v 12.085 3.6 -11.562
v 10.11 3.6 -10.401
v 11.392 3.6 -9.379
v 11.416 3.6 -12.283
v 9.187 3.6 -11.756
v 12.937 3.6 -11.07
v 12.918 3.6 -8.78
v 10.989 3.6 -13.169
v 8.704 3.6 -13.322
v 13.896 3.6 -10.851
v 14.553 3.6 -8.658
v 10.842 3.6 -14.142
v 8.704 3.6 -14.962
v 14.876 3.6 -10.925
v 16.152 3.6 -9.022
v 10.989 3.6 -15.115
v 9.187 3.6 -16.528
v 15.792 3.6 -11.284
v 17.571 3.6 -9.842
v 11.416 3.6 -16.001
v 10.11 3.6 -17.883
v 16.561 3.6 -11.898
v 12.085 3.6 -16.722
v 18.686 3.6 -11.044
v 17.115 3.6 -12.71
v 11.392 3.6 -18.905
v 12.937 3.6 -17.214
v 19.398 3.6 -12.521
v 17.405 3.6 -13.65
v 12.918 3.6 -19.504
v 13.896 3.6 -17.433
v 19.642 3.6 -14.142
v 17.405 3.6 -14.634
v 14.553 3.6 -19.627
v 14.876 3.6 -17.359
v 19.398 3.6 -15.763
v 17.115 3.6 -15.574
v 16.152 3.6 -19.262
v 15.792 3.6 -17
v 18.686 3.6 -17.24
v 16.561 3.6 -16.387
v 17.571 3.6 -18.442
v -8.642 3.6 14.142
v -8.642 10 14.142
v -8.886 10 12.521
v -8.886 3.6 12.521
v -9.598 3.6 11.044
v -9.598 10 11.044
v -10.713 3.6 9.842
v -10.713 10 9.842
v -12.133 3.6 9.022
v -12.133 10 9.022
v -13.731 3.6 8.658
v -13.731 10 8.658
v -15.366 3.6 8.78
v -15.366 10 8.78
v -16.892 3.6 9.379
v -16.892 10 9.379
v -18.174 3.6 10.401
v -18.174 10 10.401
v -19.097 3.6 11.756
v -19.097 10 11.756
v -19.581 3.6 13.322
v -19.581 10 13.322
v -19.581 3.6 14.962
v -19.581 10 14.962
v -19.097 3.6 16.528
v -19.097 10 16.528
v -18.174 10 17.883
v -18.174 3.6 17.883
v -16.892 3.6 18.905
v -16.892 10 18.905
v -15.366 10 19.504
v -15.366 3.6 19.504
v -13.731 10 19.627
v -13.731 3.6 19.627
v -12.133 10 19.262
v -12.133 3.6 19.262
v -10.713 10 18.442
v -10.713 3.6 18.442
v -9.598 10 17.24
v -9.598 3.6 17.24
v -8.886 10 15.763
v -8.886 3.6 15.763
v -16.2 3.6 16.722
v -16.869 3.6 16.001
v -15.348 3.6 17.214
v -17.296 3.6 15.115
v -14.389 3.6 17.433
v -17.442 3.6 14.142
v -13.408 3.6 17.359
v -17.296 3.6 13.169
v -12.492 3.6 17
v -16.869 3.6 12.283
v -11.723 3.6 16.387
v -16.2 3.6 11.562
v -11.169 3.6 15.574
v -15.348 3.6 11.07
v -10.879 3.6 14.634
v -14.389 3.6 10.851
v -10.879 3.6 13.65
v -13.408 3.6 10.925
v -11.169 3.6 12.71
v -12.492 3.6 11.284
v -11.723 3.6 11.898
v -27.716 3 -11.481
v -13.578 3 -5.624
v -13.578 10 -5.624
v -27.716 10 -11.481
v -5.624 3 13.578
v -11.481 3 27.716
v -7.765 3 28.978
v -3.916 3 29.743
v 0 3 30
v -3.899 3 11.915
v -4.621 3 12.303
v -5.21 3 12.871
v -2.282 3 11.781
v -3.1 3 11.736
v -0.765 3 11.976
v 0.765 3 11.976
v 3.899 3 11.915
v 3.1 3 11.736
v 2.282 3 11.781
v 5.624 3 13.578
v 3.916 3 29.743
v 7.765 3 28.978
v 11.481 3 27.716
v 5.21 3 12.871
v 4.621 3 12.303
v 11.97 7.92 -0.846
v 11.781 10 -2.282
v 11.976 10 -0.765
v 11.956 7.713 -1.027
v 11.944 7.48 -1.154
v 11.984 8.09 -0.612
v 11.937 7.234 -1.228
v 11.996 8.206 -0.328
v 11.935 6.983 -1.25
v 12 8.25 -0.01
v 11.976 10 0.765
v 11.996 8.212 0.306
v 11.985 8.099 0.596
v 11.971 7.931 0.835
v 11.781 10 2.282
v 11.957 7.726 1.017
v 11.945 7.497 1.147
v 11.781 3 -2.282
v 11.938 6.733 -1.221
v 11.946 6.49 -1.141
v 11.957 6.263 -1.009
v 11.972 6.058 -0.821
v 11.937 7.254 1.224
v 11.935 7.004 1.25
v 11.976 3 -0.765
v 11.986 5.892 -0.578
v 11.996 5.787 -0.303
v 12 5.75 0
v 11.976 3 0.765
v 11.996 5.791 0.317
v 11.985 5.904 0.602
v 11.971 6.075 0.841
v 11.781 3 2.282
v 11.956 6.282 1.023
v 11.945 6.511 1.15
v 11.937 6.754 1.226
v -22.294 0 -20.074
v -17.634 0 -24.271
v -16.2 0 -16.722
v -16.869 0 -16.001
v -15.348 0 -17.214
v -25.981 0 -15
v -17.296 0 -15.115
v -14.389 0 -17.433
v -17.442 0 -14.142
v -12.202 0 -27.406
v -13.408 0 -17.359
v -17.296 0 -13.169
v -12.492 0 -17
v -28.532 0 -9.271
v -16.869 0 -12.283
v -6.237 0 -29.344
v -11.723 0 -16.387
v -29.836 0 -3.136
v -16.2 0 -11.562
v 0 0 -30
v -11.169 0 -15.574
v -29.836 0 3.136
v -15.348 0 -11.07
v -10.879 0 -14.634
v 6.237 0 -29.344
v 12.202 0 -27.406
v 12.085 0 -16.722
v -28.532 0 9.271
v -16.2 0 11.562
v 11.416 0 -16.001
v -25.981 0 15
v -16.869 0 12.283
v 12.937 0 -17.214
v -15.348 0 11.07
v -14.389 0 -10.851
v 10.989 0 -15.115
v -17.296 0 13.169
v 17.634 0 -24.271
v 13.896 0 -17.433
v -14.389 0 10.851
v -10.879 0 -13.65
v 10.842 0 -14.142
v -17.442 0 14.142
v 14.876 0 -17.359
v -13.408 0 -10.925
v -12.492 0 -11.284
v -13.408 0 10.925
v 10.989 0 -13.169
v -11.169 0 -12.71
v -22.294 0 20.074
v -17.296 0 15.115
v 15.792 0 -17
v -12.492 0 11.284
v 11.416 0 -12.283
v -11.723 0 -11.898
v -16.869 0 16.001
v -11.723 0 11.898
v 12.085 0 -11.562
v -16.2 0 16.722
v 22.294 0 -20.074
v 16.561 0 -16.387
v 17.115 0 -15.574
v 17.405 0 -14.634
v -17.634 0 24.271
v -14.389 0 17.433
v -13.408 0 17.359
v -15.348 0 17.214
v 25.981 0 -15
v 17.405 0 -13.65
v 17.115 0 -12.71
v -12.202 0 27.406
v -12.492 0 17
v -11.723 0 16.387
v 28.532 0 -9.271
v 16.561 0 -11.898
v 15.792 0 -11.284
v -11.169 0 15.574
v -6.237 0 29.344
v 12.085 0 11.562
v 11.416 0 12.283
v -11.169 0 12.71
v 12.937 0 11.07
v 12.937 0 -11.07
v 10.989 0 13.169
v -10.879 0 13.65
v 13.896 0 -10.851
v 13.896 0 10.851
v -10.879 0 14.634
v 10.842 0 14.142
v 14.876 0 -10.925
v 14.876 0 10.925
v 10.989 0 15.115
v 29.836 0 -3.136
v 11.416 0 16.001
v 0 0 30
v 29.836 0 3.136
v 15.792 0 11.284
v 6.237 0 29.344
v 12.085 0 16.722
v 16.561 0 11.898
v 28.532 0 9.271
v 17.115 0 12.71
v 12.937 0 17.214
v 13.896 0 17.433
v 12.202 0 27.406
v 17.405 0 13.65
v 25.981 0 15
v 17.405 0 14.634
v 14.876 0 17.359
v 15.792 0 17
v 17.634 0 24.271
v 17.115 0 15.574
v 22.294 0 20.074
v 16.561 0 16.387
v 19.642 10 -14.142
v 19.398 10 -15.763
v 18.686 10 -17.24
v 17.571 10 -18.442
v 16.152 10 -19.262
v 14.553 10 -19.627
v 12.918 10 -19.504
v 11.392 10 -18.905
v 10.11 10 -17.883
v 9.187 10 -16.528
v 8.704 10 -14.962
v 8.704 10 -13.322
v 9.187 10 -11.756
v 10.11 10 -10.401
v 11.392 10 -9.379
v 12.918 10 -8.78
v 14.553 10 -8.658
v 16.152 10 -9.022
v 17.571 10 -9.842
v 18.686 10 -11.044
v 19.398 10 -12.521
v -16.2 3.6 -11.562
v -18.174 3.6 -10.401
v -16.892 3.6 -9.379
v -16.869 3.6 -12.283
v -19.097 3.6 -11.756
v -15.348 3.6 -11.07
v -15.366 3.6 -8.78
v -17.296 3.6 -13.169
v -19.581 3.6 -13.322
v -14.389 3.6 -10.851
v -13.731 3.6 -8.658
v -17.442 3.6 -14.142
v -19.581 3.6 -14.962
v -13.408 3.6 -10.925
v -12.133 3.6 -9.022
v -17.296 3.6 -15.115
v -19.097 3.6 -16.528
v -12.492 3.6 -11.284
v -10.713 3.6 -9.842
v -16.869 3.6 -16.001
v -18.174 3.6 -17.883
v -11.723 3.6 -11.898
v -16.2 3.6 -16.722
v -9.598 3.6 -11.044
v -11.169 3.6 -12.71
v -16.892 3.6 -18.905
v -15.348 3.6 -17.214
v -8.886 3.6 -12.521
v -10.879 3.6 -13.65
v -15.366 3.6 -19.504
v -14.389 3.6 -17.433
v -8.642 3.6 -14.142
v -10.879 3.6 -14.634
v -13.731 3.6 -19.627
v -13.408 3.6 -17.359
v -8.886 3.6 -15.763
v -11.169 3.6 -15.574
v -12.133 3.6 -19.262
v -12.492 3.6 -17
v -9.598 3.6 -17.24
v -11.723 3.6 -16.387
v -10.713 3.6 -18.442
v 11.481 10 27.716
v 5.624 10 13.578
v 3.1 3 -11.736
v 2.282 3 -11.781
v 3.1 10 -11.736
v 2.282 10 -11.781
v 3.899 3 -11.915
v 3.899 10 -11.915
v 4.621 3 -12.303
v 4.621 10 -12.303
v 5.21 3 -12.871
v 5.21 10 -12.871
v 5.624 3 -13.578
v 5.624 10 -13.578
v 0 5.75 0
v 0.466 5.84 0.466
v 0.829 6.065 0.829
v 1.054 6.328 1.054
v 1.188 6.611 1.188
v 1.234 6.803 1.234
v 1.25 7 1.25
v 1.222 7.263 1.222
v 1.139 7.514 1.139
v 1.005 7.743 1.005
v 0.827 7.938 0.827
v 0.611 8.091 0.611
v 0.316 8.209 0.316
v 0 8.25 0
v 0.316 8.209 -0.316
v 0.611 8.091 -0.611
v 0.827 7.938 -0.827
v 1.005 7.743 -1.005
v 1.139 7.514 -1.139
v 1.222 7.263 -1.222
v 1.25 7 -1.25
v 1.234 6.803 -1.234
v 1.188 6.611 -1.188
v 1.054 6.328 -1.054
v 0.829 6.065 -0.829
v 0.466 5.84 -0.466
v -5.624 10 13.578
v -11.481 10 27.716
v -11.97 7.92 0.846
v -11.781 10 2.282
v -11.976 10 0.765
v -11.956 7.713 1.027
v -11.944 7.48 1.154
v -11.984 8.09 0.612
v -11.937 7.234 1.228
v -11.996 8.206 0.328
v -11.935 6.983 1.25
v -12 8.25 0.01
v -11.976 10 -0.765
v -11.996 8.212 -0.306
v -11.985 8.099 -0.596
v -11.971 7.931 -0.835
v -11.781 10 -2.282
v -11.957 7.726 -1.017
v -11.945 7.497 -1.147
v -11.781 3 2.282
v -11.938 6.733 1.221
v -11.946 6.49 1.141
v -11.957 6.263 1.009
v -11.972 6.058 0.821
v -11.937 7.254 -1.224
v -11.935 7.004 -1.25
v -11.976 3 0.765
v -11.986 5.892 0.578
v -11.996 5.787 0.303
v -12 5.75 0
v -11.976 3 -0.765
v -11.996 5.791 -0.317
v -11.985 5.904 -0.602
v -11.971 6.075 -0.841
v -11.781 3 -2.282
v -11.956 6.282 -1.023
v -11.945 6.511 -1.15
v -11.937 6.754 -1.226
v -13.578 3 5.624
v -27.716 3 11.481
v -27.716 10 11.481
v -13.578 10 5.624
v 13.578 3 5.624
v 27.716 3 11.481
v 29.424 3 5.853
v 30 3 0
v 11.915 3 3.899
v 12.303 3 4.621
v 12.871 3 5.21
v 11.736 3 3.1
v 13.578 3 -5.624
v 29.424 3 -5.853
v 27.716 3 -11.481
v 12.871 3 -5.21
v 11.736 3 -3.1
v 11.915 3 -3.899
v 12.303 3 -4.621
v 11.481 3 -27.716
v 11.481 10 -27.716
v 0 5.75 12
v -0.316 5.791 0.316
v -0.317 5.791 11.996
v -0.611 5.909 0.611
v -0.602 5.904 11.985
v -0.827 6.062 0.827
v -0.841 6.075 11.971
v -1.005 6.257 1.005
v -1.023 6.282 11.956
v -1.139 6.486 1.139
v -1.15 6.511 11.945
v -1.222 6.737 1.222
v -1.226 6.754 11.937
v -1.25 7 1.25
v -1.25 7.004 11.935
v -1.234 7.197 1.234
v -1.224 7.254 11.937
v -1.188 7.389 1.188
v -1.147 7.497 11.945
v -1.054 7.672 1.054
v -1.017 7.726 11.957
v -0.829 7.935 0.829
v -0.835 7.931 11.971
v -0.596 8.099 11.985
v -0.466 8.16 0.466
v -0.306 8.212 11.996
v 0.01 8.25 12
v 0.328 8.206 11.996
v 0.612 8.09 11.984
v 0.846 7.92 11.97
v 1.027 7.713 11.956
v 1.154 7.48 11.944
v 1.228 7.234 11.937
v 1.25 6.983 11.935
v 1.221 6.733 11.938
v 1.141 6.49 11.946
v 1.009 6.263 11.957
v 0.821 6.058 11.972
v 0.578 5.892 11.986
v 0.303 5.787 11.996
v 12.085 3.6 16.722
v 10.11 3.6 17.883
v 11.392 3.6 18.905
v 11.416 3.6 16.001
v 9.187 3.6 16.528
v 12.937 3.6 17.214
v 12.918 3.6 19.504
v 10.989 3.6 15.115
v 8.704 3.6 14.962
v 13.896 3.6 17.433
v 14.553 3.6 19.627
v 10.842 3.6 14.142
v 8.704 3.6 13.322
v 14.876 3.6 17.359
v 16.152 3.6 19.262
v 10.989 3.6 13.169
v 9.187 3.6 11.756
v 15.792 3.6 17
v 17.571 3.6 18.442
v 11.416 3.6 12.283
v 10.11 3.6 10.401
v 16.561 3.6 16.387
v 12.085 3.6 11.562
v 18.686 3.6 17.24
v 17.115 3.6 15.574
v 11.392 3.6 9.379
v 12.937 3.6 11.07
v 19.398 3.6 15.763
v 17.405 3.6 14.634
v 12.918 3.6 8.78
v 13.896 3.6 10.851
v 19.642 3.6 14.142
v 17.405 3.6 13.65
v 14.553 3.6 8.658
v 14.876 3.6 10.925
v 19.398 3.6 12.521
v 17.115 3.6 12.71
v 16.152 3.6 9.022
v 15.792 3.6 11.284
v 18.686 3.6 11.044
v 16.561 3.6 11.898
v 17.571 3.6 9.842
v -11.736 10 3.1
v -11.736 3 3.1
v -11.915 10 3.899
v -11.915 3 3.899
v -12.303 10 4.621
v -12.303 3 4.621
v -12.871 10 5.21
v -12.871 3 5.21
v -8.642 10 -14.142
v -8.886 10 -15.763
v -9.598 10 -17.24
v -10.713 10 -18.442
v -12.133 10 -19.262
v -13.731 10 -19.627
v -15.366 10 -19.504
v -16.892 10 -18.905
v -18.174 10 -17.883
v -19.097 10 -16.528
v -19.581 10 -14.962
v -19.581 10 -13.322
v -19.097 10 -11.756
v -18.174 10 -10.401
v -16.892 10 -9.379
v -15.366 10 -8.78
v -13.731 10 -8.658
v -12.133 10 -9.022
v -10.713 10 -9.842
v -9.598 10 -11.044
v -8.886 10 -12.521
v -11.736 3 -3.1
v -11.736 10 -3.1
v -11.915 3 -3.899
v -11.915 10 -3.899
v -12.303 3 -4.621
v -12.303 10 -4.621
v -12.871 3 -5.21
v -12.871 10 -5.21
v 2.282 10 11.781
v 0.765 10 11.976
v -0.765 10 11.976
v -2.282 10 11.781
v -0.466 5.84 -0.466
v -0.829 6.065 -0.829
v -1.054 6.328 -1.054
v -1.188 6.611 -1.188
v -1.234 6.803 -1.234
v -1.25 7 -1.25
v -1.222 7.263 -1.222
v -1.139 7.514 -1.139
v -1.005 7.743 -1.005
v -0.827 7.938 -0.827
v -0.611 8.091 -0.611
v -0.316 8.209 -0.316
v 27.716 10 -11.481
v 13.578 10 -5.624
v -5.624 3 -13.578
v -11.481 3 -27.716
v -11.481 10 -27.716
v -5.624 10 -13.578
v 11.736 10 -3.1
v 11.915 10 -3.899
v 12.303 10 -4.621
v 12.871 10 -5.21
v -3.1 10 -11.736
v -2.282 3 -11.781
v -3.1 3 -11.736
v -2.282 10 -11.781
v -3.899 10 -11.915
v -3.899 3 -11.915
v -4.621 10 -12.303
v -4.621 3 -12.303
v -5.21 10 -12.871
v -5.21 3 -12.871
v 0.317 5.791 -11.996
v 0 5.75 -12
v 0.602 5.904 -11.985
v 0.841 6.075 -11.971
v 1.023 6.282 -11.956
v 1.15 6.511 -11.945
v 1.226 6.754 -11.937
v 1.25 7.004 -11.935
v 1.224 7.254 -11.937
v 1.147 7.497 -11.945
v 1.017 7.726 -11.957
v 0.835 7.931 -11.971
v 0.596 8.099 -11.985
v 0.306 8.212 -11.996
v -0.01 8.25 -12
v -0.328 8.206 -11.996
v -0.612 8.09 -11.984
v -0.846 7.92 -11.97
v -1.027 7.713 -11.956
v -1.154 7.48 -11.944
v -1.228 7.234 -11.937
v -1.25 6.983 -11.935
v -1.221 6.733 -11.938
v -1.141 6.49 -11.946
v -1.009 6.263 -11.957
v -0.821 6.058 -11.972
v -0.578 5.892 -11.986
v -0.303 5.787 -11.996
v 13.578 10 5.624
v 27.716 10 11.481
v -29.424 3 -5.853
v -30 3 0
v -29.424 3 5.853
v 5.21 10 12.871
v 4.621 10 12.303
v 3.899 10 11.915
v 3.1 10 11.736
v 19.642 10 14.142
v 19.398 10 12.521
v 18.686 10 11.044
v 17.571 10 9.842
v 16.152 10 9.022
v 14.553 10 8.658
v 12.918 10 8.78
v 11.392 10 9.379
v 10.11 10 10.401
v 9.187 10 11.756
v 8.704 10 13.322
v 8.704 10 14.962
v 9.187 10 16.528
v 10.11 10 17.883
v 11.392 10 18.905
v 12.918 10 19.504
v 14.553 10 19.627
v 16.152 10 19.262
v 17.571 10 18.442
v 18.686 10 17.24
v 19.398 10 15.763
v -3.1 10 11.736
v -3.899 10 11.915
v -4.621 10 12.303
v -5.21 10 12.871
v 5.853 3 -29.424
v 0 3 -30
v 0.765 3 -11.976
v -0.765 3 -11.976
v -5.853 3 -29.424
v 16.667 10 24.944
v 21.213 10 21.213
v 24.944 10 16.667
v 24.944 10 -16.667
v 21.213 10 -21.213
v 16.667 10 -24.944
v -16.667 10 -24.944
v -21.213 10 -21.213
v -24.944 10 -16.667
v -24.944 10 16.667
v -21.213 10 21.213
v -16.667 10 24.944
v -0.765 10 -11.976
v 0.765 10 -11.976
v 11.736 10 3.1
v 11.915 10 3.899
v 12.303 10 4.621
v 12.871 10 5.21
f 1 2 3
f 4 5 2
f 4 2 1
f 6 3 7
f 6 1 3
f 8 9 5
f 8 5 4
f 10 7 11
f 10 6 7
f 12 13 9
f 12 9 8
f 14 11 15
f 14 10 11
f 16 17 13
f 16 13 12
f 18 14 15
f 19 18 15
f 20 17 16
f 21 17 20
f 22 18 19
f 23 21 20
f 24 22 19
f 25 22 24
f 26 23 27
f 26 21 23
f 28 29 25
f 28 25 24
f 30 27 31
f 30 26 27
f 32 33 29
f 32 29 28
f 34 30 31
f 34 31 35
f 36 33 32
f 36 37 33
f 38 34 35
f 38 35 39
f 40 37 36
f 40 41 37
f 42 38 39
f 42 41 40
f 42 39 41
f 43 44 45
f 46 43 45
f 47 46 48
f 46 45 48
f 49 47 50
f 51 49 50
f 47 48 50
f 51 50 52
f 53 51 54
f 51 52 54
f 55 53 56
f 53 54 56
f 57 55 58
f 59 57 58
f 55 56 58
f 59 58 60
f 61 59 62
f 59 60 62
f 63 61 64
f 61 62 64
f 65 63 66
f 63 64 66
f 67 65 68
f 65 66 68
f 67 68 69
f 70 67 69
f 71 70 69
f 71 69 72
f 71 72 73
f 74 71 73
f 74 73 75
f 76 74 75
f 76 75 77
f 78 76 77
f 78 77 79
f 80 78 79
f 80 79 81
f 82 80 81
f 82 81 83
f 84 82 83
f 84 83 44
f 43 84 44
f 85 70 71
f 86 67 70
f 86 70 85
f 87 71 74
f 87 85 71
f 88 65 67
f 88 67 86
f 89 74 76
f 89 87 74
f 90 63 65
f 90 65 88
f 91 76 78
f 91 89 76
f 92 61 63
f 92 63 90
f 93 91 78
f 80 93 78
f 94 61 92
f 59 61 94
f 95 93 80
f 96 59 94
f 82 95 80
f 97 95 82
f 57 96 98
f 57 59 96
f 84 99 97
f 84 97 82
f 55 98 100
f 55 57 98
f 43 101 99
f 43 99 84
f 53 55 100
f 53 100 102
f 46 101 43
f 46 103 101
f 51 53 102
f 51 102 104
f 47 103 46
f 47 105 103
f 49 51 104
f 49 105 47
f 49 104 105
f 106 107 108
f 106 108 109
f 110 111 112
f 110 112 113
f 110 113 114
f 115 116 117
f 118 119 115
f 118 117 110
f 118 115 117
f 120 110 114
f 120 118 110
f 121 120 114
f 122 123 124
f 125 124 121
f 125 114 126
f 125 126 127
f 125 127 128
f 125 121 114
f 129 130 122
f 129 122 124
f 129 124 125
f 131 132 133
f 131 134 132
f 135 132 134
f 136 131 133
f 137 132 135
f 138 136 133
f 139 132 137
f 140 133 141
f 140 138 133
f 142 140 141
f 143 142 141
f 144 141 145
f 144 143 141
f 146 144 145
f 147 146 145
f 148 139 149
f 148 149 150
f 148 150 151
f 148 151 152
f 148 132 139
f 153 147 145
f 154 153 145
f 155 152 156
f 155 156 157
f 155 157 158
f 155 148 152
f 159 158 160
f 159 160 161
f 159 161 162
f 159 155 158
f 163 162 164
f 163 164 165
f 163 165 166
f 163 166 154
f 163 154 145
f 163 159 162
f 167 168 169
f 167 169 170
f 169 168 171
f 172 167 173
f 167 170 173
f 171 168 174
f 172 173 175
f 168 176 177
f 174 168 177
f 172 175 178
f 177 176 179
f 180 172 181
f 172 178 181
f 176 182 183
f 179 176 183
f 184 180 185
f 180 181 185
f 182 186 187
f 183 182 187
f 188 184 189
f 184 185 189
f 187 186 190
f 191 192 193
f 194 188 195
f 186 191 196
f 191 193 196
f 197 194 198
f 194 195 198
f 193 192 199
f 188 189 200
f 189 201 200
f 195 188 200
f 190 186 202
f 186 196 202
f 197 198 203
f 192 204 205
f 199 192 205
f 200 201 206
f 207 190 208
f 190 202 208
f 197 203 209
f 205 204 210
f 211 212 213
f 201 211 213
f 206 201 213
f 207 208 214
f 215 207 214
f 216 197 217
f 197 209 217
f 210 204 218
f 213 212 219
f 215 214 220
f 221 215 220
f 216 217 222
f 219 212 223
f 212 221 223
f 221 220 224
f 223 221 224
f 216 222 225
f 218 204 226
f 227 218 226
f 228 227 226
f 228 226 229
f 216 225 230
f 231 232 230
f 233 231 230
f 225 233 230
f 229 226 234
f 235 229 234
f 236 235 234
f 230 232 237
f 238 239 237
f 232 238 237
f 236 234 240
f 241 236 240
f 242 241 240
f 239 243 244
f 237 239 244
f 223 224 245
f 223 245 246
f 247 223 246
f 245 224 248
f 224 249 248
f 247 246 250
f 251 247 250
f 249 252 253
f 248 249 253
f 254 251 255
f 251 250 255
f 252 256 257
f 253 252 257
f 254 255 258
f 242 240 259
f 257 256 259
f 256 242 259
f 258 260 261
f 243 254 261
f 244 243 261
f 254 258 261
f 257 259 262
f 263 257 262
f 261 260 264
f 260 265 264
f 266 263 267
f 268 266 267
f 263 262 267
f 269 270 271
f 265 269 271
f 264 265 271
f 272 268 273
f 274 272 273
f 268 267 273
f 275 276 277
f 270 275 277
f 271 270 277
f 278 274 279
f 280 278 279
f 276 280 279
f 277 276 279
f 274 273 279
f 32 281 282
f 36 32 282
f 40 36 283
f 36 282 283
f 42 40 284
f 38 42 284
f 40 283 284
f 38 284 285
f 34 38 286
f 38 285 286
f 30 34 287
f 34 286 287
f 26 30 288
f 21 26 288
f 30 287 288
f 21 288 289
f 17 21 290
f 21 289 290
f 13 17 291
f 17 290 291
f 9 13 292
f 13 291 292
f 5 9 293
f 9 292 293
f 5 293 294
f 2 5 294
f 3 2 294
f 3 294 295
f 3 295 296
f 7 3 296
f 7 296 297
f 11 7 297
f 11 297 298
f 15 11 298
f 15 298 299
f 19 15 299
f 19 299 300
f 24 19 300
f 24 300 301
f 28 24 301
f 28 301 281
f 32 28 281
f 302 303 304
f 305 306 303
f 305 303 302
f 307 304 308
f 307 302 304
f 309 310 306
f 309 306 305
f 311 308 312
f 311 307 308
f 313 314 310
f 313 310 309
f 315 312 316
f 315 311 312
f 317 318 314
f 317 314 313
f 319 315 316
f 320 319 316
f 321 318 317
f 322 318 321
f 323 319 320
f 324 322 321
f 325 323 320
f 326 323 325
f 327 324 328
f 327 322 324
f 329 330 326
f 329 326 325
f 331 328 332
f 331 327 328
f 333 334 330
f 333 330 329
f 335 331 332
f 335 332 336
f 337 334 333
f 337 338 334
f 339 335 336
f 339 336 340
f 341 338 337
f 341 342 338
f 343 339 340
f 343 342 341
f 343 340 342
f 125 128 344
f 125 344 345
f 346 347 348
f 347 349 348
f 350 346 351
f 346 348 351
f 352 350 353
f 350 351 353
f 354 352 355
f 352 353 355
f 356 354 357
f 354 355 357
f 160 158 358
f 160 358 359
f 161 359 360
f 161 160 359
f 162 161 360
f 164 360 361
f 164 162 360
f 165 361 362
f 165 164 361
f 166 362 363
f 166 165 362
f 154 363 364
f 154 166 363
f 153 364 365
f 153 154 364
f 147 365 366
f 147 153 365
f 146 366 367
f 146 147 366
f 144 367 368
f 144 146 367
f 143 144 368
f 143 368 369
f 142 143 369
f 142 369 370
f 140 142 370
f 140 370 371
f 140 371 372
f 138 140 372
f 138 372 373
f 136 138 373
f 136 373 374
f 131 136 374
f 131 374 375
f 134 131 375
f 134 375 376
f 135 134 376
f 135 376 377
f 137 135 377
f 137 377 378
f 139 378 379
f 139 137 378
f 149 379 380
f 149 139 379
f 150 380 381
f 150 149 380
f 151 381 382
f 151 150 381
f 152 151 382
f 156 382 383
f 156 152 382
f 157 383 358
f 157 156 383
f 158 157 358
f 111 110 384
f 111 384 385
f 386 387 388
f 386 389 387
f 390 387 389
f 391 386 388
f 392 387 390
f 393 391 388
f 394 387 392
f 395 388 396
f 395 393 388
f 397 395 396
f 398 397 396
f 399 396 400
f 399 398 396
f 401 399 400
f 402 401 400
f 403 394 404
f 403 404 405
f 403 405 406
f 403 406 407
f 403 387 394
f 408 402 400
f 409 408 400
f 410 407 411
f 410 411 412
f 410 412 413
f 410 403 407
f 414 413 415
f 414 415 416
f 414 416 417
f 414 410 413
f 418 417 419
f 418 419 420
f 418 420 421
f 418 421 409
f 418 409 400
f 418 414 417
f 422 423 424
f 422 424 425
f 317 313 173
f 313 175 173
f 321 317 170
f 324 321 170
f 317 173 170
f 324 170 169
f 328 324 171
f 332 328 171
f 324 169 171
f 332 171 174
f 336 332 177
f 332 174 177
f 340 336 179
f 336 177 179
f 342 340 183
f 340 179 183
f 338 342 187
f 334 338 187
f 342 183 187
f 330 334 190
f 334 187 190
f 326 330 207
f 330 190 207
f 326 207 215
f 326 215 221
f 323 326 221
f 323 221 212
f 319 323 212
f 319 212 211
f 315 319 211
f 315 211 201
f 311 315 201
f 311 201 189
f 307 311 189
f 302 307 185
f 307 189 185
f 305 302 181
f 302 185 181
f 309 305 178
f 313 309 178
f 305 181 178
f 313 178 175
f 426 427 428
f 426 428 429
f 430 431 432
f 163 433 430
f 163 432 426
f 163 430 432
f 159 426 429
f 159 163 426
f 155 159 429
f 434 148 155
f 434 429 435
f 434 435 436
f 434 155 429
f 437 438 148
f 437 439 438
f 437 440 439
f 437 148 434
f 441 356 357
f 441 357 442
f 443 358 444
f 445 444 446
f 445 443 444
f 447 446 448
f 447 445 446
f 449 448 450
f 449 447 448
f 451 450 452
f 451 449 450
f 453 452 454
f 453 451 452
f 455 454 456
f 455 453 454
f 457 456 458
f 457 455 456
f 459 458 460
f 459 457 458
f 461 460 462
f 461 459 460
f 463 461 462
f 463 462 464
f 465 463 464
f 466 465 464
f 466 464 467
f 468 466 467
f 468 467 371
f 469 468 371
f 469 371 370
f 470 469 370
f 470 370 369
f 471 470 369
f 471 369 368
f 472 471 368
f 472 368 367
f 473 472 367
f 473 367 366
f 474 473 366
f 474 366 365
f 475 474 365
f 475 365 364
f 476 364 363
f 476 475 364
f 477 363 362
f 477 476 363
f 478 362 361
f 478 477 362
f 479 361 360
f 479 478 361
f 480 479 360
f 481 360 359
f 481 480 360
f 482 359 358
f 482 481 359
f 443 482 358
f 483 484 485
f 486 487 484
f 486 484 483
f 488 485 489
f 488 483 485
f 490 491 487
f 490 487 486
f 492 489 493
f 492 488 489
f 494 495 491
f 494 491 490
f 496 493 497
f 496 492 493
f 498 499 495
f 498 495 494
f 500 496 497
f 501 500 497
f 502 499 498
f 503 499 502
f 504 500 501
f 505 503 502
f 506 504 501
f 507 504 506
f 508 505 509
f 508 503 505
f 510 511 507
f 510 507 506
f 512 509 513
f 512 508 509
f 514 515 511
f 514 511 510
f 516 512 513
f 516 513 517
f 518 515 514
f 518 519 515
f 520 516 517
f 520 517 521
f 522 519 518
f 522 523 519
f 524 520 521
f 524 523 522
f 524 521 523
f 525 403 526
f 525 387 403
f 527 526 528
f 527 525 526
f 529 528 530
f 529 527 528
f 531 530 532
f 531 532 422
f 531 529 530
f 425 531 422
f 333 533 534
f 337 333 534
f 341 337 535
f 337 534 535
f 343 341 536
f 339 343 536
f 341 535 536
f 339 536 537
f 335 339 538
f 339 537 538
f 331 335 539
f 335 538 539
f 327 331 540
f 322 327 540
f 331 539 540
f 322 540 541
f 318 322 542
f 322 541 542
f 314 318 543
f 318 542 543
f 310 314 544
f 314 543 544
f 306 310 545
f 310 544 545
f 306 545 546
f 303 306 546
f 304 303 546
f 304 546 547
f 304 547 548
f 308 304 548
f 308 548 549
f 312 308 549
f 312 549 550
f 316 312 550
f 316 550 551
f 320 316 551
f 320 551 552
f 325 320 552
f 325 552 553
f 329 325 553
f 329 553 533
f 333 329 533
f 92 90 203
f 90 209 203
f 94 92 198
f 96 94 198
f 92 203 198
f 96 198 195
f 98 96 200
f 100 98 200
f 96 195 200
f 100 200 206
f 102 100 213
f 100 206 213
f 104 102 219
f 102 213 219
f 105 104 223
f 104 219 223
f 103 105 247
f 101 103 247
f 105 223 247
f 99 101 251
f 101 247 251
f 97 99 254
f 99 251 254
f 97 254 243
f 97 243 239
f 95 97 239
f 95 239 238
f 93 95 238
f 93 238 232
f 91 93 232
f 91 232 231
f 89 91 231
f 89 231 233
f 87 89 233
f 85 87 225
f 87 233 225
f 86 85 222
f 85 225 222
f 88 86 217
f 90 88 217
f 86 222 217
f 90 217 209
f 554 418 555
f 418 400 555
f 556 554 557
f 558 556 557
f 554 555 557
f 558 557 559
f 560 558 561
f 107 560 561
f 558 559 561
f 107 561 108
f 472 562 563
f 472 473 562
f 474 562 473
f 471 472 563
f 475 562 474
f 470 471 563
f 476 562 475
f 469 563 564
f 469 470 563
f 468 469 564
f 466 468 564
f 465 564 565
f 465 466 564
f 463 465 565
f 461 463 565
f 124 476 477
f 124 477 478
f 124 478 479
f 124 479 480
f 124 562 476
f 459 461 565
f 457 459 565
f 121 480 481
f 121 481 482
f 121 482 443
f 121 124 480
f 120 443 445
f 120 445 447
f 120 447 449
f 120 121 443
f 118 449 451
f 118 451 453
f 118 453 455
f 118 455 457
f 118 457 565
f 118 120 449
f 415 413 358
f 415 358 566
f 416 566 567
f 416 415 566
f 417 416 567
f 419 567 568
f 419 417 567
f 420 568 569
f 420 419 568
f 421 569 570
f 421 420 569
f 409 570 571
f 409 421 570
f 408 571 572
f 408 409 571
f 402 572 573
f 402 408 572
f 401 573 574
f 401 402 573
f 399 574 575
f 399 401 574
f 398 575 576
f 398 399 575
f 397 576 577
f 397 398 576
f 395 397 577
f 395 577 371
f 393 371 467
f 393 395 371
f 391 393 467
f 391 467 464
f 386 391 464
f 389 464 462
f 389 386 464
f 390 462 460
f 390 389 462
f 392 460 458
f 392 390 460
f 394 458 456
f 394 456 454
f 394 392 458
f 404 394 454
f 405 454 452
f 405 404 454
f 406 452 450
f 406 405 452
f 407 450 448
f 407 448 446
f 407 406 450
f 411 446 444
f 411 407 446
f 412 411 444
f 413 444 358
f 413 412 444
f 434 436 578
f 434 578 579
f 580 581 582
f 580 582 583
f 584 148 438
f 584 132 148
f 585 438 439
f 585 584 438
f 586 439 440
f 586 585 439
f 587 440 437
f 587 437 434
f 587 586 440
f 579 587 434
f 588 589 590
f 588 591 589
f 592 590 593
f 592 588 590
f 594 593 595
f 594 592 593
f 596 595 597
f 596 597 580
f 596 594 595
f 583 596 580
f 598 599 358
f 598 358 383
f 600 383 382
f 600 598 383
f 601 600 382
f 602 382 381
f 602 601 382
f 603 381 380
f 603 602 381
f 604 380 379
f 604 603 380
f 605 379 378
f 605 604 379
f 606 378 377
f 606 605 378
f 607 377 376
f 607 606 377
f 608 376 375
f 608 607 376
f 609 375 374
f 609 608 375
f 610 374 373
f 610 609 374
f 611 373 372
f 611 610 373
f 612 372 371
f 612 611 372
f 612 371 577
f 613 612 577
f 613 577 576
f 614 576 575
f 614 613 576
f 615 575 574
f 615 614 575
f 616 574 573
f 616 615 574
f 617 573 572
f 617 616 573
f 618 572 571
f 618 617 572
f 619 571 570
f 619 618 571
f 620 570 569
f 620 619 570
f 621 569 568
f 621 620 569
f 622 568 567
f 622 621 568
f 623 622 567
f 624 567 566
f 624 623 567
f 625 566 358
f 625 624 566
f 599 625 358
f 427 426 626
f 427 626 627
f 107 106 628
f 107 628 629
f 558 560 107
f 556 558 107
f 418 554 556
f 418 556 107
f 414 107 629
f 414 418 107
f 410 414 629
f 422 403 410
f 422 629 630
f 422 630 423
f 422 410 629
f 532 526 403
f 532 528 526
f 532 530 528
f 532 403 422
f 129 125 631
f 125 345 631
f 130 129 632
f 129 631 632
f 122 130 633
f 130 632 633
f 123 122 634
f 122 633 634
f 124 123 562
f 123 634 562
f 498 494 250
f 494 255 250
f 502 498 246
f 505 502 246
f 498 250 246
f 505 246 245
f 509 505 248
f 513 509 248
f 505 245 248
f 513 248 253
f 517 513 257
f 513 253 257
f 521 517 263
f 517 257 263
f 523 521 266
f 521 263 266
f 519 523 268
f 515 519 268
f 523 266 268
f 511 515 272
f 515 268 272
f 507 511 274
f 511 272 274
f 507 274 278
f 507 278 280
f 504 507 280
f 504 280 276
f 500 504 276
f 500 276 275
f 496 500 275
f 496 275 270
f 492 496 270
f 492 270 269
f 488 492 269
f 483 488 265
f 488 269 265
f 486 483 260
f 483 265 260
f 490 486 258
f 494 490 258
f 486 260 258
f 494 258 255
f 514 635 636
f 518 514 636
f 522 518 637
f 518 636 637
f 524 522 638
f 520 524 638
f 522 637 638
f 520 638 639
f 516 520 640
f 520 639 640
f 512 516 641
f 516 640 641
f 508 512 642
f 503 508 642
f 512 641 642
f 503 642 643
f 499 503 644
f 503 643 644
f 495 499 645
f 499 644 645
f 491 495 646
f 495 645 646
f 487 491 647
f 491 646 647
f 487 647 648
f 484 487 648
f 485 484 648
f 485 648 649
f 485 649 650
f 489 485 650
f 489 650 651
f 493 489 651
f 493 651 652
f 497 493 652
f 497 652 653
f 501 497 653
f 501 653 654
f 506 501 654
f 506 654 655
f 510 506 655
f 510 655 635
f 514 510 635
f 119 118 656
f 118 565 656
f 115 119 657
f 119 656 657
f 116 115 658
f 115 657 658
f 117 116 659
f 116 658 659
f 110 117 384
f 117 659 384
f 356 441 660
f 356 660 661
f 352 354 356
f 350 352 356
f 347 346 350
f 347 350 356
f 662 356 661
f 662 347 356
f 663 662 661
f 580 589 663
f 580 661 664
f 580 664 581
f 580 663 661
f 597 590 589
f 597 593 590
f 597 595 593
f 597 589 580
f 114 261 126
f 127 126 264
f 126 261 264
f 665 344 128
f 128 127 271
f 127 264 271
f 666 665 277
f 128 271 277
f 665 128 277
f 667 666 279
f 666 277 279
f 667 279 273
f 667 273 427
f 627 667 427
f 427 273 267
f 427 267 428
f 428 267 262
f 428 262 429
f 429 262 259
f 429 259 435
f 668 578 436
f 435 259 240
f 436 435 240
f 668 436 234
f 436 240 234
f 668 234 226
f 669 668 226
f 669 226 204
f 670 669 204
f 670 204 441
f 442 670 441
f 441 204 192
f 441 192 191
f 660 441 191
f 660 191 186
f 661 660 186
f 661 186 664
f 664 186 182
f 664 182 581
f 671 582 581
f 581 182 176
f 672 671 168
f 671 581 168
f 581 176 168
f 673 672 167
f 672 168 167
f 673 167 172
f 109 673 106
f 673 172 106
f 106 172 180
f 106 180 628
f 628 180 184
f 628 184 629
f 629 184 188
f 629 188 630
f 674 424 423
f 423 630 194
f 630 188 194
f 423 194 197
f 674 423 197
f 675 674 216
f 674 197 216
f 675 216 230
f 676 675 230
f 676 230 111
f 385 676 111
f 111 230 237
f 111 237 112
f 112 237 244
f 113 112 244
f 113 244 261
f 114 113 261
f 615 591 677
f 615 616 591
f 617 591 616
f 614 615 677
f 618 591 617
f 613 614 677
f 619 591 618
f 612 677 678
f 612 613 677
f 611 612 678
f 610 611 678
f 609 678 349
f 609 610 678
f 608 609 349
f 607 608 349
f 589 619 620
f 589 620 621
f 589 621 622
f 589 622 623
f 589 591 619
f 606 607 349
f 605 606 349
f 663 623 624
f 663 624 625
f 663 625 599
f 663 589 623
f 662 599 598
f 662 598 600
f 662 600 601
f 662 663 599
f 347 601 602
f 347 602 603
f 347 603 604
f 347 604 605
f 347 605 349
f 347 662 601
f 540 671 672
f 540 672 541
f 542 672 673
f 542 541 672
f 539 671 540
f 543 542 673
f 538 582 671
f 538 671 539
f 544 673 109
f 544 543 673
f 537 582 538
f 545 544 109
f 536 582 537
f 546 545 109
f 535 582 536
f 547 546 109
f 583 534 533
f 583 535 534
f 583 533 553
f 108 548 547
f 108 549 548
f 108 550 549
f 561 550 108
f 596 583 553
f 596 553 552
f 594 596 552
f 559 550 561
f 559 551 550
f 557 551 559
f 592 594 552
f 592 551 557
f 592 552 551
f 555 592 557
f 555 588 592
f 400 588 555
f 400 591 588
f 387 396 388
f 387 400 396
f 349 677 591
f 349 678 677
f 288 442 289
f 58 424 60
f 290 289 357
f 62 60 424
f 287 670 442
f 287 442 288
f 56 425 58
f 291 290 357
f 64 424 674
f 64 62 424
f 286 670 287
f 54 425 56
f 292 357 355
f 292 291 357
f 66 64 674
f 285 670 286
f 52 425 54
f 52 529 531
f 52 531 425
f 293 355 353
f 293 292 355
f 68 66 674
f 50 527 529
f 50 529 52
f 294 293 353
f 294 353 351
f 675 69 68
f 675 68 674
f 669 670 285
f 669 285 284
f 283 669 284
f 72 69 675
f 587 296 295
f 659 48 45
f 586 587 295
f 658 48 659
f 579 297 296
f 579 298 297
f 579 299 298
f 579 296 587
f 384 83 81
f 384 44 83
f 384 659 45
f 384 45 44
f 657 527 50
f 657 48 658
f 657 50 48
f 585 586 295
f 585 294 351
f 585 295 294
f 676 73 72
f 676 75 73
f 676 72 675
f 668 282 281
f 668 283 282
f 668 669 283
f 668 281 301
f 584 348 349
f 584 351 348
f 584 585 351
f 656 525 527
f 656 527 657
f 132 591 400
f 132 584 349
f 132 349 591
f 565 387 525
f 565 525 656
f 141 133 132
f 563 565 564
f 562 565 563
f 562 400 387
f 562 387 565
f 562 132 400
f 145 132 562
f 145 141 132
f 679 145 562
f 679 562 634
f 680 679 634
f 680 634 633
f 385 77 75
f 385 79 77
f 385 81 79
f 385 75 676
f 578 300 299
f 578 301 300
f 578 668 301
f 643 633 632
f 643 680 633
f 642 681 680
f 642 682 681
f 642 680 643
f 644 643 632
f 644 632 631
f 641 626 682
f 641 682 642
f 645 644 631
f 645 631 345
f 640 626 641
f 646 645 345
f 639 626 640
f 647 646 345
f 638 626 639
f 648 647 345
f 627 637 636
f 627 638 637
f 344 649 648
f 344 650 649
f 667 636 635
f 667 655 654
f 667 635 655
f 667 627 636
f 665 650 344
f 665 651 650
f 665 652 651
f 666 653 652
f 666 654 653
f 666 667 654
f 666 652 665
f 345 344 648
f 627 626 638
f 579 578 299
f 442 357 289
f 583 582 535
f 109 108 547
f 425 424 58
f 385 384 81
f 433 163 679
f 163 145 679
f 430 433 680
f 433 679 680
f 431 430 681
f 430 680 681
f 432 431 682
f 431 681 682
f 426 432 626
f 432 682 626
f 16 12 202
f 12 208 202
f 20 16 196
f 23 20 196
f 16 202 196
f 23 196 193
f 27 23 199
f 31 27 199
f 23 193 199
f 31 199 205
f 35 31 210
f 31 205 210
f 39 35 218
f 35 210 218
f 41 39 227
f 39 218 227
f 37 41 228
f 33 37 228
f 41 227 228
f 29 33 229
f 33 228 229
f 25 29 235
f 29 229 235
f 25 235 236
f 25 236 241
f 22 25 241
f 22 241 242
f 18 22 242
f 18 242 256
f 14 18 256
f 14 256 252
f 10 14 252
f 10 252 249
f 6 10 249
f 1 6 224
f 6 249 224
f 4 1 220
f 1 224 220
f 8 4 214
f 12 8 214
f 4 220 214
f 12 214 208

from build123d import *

# Parameters (mm, degrees)
SKETCH1_R                                           = 30
BOSS_EXTRUDE1_DEPTH                                 = 10
CBORE_FOR_M6_HEX_SOCKET_HEAD_CAP_SCREW1_D           = 6.6
CBORE_FOR_M6_HEX_SOCKET_HEAD_CAP_SCREW1_CBORE_D     = 11
CBORE_FOR_M6_HEX_SOCKET_HEAD_CAP_SCREW1_CBORE_DEPTH = 6.4
CUT_EXTRUDE1_START                                  = -7
CUT_EXTRUDE1_DEPTH                                  = 7
CIRPATTERN1_COUNT                                   = 4
FILLET1_R                                           = 3


with BuildPart() as part:
    # Sketch1 → Boss-Extrude1 (new body)
    with BuildSketch(Plane(origin=(0, 0, 0), x_dir=(1, 0, 0), z_dir=(0, 1, 0))):
        with Locations(Location((0, 0, 0), (0, 0, 270))):
            Circle(SKETCH1_R)
    extrude(amount=BOSS_EXTRUDE1_DEPTH)

    # CBORE for M6 Hex Socket Head Cap Screw1 (through all)
    with Locations(Plane(origin=(0, 10, 0), x_dir=(1, 0, 0), z_dir=(0, 1, 0))):
        with Locations((14.142135624, -14.142135624), (14.142135624, 14.142135624), (-14.142135624, 14.142135624), (-14.142135624, -14.142135624)):
            CounterBoreHole(CBORE_FOR_M6_HEX_SOCKET_HEAD_CAP_SCREW1_D / 2, CBORE_FOR_M6_HEX_SOCKET_HEAD_CAP_SCREW1_CBORE_D / 2, CBORE_FOR_M6_HEX_SOCKET_HEAD_CAP_SCREW1_CBORE_DEPTH)

    # Sketch4 → Cut-Extrude1 (cut)
    with BuildSketch(Plane(origin=(0, 10, 0), x_dir=(1, 0, 0), z_dir=(0, 1, 0)).offset(CUT_EXTRUDE1_START)):
        with BuildLine():
            ThreePointArc((4.592201188, -11.08655439), (0, -12), (-4.592201188, -11.08655439))
            Line((-4.592201188, -11.08655439), (-11.480502971, -27.716385975))
            ThreePointArc((-11.480502971, -27.716385975), (0, -30), (11.480502971, -27.716385975))
            Line((11.480502971, -27.716385975), (4.592201188, -11.08655439))
        make_face()
    cut_extrude1 = extrude(amount=CUT_EXTRUDE1_DEPTH, mode=Mode.SUBTRACT)

    # Sketch6 → M3 Tapped Hole1 (revolve, cut)
    with BuildSketch(Plane(origin=(0, 7, 12), x_dir=(0, -1, 0), z_dir=(1, 0, 0))):
        Polygon((0, 0), (0, 12.751075774), (1.25, 12), (1.25, 0), align=None)
    m3_tapped_hole1 = revolve(axis=Axis((0, 7, 18.35), (0, 0, -1)), mode=Mode.SUBTRACT)

    # CirPattern1: Cut-Extrude1, M3 Tapped Hole1 ×4 about axis
    cirpattern1_axis = Axis((0, 10, 0), (0, 1, 0))
    add([cut_extrude1.rotate(cirpattern1_axis, i * 360 / CIRPATTERN1_COUNT) for i in range(1, CIRPATTERN1_COUNT)], mode=Mode.SUBTRACT)
    add([m3_tapped_hole1.rotate(cirpattern1_axis, i * 360 / CIRPATTERN1_COUNT) for i in range(1, CIRPATTERN1_COUNT)], mode=Mode.SUBTRACT)

    # Fillet1
    fillet1_edges = [part.edges().sort_by_distance(p)[0] for p in [
        (-4.592201188, 6.5, 11.08655439),
        (4.592201188, 6.5, 11.08655439),
        (4.592201188, 6.5, -11.08655439),
        (-4.592201188, 6.5, -11.08655439),
        (-11.08655439, 6.5, -4.592201188),
        (-11.08655439, 6.5, 4.592201188),
        (11.08655439, 6.5, 4.592201188),
        (11.08655439, 6.5, -4.592201188),
    ]]
    fillet(fillet1_edges, radius=FILLET1_R)


solid = part.part
